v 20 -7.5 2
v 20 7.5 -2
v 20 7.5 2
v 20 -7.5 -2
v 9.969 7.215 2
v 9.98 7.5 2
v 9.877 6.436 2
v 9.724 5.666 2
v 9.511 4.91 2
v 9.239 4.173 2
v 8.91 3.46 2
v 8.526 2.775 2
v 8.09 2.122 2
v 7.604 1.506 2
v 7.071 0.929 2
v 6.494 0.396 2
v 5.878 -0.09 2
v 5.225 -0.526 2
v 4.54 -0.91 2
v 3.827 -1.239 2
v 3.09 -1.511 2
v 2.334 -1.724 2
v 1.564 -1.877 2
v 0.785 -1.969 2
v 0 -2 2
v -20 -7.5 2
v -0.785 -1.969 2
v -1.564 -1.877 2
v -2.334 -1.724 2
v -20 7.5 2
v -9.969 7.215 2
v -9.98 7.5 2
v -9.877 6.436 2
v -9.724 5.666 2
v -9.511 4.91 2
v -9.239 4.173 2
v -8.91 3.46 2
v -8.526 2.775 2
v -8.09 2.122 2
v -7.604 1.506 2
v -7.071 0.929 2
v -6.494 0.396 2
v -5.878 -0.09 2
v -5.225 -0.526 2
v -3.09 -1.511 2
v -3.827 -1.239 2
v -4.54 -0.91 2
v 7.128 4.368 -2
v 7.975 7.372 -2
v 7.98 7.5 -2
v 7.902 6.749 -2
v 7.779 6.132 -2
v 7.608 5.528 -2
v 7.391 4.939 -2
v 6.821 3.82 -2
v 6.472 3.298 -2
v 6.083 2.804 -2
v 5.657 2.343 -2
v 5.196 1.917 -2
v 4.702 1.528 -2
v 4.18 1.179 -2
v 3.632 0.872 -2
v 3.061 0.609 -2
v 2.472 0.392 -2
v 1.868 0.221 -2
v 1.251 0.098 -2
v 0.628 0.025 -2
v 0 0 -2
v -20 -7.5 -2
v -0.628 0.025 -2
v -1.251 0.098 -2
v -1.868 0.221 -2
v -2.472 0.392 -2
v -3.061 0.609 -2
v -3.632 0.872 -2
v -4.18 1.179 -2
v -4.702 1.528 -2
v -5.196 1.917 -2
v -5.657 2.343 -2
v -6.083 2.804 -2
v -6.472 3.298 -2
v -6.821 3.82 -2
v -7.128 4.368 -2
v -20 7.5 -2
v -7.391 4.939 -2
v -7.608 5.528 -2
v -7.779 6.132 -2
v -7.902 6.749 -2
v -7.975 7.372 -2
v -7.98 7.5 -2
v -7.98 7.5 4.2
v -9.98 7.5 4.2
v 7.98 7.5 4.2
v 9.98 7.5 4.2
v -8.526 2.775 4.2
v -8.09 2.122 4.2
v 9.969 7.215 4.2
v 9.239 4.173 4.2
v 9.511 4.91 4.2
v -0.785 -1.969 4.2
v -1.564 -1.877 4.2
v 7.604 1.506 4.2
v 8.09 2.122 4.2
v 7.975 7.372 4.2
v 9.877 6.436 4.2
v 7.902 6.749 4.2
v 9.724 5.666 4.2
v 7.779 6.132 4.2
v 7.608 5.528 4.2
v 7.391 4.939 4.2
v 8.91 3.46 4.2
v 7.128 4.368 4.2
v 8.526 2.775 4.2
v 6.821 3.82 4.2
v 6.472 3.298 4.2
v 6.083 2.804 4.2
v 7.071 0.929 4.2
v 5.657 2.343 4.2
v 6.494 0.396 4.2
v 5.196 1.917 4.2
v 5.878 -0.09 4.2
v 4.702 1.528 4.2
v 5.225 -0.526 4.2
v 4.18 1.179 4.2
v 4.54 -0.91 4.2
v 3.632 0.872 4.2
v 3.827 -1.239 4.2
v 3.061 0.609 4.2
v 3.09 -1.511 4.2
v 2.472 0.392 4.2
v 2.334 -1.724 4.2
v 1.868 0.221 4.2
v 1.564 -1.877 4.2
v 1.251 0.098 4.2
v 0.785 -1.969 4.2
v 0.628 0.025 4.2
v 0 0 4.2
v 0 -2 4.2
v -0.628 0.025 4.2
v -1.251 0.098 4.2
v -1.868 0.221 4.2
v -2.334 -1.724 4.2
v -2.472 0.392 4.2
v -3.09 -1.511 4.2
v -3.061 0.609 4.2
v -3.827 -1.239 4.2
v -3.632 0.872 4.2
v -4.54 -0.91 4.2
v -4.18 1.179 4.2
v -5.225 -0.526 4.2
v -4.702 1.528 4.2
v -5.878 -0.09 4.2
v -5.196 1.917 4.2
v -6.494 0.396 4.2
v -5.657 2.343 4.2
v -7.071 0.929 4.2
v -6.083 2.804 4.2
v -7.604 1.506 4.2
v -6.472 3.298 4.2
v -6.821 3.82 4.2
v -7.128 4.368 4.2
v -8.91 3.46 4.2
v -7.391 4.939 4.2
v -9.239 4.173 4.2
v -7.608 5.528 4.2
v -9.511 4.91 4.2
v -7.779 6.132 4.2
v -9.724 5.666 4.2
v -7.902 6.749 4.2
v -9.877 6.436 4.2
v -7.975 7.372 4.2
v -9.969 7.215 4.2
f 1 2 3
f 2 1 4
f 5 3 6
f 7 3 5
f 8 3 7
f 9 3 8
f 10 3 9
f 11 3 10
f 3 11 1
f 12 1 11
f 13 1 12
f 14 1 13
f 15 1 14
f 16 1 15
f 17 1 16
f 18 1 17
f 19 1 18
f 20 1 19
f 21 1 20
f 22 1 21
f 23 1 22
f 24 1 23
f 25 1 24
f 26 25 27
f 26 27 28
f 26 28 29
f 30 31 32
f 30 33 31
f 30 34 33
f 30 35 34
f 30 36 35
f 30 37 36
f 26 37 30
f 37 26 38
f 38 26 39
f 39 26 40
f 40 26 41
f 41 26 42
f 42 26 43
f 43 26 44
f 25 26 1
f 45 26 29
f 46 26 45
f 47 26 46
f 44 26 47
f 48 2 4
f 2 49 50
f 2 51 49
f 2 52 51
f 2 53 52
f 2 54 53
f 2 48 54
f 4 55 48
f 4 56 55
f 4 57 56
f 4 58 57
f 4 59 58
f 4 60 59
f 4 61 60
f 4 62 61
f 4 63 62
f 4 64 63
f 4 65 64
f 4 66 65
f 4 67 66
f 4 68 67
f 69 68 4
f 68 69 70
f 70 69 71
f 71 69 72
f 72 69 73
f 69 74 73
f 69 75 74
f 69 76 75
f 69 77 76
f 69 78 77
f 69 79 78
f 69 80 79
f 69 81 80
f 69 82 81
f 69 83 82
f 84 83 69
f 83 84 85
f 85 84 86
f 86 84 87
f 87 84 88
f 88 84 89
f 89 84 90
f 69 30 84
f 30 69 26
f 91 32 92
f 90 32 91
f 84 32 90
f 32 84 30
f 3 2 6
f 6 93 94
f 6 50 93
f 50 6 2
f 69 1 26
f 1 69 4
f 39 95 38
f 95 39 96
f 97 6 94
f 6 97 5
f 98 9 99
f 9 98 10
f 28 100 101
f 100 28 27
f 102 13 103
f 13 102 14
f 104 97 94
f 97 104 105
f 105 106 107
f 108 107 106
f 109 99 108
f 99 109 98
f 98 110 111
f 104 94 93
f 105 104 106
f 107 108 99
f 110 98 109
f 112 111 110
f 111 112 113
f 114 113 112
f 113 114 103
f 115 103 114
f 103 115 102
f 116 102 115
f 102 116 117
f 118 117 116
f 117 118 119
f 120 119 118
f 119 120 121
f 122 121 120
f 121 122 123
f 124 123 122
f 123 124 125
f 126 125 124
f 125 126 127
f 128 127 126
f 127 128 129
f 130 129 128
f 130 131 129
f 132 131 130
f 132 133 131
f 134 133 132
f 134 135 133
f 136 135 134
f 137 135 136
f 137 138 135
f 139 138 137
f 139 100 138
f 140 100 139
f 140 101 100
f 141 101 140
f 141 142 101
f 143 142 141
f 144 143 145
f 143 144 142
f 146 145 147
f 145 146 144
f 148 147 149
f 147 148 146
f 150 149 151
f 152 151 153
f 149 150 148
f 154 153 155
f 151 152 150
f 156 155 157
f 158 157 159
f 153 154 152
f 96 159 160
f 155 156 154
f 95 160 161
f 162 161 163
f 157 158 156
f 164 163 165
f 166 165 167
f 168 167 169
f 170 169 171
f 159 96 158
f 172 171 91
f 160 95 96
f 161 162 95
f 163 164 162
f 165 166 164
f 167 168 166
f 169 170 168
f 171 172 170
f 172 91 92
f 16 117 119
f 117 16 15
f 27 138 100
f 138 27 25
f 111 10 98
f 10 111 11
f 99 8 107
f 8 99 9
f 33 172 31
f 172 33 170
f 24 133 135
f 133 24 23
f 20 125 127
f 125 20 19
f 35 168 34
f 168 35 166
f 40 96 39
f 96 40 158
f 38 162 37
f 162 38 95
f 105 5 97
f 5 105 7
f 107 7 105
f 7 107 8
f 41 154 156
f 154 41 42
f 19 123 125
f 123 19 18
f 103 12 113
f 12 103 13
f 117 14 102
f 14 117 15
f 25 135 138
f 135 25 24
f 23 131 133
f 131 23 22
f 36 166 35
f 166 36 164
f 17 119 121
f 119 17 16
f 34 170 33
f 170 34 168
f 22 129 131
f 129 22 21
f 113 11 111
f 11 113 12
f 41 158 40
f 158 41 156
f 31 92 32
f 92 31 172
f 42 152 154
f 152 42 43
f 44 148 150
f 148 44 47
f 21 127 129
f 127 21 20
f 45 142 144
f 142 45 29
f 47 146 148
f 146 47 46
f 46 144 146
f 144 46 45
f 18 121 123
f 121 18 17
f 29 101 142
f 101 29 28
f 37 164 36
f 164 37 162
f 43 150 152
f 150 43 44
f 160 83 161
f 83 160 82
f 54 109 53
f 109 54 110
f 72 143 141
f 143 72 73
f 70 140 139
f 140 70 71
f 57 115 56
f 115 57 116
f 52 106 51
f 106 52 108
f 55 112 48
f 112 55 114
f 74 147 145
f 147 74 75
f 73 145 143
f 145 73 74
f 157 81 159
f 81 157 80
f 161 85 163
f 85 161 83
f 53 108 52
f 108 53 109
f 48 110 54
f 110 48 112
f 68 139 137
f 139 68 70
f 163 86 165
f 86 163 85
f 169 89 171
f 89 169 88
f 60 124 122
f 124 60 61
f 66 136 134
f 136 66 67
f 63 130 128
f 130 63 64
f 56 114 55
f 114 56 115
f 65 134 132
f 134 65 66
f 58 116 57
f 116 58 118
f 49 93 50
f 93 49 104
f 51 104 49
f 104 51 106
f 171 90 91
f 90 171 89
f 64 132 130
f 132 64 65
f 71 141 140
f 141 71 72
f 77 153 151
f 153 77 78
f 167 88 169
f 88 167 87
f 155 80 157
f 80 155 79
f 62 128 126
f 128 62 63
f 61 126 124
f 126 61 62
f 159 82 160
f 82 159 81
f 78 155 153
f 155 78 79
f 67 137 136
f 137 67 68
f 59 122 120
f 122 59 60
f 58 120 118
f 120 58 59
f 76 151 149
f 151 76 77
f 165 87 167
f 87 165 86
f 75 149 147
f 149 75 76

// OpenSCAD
// Length of Stopper
length = 40;
// Width of Stopper
width = 15;
// Cavity diameter
diameter = 16;
// Thickness
thick = 4;
// Thickness of Cavity
thick_cavity = 6;

$fn=80;
// Model
difference() {
    union() {
        cube([length, width, thick], center=true);
        translate([0, diameter/2, -(thick/2)]) {
            cylinder(h=thick_cavity+0.2, r=diameter/2+2);
        };
    };
    translate([0, diameter/2, -(thick/2+0.2)]) {
        cylinder(h=thick_cavity+0.6, r=diameter/2);
    };
    translate([0, width+0.1, 0]) {
        cube([length+0.2, width+0.2, thick_cavity*2], center=true);
    };
};
